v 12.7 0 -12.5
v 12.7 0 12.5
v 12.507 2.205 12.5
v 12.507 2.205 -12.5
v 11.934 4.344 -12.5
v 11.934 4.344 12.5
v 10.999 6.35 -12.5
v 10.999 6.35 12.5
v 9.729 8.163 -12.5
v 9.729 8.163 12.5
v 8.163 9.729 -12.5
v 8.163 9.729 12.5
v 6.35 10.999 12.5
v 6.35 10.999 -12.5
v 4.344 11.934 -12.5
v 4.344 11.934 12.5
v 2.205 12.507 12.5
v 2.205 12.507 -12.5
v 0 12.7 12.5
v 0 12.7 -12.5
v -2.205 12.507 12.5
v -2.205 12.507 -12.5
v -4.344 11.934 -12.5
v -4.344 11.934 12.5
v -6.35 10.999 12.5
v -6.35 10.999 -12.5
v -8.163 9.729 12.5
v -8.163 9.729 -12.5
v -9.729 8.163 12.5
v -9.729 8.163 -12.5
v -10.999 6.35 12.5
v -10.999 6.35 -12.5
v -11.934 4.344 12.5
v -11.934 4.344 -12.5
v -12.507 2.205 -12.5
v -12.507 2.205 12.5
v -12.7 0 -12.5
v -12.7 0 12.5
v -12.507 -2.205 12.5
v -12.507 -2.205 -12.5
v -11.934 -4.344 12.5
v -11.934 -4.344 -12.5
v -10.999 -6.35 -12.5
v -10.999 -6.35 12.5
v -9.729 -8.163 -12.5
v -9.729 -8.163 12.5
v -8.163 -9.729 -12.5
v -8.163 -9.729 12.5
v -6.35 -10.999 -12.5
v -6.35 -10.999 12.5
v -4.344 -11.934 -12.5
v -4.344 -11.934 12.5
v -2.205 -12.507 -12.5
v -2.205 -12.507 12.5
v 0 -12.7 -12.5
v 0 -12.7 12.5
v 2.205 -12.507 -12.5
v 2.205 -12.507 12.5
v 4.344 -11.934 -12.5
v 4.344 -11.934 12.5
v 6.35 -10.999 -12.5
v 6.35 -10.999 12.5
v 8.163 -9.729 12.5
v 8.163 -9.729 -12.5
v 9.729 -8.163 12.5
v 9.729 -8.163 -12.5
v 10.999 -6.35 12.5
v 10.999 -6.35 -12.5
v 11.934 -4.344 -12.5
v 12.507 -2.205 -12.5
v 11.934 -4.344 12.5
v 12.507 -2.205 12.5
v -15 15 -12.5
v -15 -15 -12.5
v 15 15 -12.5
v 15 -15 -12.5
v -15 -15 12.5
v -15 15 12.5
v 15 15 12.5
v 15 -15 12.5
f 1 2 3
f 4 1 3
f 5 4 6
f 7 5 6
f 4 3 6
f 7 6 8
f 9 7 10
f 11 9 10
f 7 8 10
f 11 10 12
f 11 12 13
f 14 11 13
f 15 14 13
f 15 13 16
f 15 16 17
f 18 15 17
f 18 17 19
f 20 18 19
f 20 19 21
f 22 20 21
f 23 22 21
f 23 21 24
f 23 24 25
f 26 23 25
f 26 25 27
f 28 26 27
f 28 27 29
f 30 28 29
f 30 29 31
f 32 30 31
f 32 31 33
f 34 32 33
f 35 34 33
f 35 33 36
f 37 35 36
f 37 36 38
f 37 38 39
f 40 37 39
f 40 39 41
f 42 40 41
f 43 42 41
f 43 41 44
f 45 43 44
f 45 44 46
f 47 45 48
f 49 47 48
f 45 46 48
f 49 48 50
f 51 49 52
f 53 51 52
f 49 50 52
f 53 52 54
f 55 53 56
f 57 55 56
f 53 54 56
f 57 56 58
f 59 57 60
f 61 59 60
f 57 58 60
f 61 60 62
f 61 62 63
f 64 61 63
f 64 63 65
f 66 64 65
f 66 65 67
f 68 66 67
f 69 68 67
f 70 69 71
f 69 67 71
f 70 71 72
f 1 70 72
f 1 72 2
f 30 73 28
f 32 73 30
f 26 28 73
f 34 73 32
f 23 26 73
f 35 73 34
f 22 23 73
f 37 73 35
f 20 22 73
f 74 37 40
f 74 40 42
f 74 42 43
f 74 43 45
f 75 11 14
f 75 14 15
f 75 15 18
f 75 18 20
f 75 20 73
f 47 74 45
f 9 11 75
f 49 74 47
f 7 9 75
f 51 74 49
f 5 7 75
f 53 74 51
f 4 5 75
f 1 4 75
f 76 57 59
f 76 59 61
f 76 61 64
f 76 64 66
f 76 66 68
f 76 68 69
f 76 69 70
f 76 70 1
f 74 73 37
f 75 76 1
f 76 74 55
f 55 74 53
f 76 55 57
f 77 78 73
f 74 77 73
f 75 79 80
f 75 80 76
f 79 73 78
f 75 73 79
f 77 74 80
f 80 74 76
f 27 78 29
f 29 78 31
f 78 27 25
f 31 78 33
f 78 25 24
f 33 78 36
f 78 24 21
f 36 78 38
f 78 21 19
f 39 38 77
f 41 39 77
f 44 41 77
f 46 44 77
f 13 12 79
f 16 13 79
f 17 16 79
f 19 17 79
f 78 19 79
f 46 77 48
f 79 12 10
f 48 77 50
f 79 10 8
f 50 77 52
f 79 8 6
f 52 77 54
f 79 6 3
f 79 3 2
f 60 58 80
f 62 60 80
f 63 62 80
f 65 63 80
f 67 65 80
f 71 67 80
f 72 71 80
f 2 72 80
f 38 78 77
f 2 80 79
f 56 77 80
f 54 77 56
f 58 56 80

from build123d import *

# Parameters (mm, degrees)
BOSS_EXTRUDE1_DEPTH      = 15
BOSS_EXTRUDE1_DEPTH_BACK = 15
SKETCH1_W                = 30
SKETCH1_H                = 25
SKETCH2_R                = 12.7
CUT_EXTRUDE1_DEPTH       = 33.787192622


with BuildPart() as part:
    # Sketch1 → Boss-Extrude1 (new, two sides: drawn at the far end of the back side and taken through both)
    with BuildSketch(Plane(origin=(0, 0, 0), x_dir=(1, 0, 0), z_dir=(0, 1, 0)).offset(-BOSS_EXTRUDE1_DEPTH_BACK)):
        Rectangle(SKETCH1_W, SKETCH1_H)
    extrude(amount=BOSS_EXTRUDE1_DEPTH + BOSS_EXTRUDE1_DEPTH_BACK)

    # Sketch2 → Cut-Extrude1 (cut, through all)
    with BuildSketch(Plane.XY.offset(12.5)):
        Circle(SKETCH2_R)
    extrude(amount=-CUT_EXTRUDE1_DEPTH, mode=Mode.SUBTRACT)


solid = part.part
